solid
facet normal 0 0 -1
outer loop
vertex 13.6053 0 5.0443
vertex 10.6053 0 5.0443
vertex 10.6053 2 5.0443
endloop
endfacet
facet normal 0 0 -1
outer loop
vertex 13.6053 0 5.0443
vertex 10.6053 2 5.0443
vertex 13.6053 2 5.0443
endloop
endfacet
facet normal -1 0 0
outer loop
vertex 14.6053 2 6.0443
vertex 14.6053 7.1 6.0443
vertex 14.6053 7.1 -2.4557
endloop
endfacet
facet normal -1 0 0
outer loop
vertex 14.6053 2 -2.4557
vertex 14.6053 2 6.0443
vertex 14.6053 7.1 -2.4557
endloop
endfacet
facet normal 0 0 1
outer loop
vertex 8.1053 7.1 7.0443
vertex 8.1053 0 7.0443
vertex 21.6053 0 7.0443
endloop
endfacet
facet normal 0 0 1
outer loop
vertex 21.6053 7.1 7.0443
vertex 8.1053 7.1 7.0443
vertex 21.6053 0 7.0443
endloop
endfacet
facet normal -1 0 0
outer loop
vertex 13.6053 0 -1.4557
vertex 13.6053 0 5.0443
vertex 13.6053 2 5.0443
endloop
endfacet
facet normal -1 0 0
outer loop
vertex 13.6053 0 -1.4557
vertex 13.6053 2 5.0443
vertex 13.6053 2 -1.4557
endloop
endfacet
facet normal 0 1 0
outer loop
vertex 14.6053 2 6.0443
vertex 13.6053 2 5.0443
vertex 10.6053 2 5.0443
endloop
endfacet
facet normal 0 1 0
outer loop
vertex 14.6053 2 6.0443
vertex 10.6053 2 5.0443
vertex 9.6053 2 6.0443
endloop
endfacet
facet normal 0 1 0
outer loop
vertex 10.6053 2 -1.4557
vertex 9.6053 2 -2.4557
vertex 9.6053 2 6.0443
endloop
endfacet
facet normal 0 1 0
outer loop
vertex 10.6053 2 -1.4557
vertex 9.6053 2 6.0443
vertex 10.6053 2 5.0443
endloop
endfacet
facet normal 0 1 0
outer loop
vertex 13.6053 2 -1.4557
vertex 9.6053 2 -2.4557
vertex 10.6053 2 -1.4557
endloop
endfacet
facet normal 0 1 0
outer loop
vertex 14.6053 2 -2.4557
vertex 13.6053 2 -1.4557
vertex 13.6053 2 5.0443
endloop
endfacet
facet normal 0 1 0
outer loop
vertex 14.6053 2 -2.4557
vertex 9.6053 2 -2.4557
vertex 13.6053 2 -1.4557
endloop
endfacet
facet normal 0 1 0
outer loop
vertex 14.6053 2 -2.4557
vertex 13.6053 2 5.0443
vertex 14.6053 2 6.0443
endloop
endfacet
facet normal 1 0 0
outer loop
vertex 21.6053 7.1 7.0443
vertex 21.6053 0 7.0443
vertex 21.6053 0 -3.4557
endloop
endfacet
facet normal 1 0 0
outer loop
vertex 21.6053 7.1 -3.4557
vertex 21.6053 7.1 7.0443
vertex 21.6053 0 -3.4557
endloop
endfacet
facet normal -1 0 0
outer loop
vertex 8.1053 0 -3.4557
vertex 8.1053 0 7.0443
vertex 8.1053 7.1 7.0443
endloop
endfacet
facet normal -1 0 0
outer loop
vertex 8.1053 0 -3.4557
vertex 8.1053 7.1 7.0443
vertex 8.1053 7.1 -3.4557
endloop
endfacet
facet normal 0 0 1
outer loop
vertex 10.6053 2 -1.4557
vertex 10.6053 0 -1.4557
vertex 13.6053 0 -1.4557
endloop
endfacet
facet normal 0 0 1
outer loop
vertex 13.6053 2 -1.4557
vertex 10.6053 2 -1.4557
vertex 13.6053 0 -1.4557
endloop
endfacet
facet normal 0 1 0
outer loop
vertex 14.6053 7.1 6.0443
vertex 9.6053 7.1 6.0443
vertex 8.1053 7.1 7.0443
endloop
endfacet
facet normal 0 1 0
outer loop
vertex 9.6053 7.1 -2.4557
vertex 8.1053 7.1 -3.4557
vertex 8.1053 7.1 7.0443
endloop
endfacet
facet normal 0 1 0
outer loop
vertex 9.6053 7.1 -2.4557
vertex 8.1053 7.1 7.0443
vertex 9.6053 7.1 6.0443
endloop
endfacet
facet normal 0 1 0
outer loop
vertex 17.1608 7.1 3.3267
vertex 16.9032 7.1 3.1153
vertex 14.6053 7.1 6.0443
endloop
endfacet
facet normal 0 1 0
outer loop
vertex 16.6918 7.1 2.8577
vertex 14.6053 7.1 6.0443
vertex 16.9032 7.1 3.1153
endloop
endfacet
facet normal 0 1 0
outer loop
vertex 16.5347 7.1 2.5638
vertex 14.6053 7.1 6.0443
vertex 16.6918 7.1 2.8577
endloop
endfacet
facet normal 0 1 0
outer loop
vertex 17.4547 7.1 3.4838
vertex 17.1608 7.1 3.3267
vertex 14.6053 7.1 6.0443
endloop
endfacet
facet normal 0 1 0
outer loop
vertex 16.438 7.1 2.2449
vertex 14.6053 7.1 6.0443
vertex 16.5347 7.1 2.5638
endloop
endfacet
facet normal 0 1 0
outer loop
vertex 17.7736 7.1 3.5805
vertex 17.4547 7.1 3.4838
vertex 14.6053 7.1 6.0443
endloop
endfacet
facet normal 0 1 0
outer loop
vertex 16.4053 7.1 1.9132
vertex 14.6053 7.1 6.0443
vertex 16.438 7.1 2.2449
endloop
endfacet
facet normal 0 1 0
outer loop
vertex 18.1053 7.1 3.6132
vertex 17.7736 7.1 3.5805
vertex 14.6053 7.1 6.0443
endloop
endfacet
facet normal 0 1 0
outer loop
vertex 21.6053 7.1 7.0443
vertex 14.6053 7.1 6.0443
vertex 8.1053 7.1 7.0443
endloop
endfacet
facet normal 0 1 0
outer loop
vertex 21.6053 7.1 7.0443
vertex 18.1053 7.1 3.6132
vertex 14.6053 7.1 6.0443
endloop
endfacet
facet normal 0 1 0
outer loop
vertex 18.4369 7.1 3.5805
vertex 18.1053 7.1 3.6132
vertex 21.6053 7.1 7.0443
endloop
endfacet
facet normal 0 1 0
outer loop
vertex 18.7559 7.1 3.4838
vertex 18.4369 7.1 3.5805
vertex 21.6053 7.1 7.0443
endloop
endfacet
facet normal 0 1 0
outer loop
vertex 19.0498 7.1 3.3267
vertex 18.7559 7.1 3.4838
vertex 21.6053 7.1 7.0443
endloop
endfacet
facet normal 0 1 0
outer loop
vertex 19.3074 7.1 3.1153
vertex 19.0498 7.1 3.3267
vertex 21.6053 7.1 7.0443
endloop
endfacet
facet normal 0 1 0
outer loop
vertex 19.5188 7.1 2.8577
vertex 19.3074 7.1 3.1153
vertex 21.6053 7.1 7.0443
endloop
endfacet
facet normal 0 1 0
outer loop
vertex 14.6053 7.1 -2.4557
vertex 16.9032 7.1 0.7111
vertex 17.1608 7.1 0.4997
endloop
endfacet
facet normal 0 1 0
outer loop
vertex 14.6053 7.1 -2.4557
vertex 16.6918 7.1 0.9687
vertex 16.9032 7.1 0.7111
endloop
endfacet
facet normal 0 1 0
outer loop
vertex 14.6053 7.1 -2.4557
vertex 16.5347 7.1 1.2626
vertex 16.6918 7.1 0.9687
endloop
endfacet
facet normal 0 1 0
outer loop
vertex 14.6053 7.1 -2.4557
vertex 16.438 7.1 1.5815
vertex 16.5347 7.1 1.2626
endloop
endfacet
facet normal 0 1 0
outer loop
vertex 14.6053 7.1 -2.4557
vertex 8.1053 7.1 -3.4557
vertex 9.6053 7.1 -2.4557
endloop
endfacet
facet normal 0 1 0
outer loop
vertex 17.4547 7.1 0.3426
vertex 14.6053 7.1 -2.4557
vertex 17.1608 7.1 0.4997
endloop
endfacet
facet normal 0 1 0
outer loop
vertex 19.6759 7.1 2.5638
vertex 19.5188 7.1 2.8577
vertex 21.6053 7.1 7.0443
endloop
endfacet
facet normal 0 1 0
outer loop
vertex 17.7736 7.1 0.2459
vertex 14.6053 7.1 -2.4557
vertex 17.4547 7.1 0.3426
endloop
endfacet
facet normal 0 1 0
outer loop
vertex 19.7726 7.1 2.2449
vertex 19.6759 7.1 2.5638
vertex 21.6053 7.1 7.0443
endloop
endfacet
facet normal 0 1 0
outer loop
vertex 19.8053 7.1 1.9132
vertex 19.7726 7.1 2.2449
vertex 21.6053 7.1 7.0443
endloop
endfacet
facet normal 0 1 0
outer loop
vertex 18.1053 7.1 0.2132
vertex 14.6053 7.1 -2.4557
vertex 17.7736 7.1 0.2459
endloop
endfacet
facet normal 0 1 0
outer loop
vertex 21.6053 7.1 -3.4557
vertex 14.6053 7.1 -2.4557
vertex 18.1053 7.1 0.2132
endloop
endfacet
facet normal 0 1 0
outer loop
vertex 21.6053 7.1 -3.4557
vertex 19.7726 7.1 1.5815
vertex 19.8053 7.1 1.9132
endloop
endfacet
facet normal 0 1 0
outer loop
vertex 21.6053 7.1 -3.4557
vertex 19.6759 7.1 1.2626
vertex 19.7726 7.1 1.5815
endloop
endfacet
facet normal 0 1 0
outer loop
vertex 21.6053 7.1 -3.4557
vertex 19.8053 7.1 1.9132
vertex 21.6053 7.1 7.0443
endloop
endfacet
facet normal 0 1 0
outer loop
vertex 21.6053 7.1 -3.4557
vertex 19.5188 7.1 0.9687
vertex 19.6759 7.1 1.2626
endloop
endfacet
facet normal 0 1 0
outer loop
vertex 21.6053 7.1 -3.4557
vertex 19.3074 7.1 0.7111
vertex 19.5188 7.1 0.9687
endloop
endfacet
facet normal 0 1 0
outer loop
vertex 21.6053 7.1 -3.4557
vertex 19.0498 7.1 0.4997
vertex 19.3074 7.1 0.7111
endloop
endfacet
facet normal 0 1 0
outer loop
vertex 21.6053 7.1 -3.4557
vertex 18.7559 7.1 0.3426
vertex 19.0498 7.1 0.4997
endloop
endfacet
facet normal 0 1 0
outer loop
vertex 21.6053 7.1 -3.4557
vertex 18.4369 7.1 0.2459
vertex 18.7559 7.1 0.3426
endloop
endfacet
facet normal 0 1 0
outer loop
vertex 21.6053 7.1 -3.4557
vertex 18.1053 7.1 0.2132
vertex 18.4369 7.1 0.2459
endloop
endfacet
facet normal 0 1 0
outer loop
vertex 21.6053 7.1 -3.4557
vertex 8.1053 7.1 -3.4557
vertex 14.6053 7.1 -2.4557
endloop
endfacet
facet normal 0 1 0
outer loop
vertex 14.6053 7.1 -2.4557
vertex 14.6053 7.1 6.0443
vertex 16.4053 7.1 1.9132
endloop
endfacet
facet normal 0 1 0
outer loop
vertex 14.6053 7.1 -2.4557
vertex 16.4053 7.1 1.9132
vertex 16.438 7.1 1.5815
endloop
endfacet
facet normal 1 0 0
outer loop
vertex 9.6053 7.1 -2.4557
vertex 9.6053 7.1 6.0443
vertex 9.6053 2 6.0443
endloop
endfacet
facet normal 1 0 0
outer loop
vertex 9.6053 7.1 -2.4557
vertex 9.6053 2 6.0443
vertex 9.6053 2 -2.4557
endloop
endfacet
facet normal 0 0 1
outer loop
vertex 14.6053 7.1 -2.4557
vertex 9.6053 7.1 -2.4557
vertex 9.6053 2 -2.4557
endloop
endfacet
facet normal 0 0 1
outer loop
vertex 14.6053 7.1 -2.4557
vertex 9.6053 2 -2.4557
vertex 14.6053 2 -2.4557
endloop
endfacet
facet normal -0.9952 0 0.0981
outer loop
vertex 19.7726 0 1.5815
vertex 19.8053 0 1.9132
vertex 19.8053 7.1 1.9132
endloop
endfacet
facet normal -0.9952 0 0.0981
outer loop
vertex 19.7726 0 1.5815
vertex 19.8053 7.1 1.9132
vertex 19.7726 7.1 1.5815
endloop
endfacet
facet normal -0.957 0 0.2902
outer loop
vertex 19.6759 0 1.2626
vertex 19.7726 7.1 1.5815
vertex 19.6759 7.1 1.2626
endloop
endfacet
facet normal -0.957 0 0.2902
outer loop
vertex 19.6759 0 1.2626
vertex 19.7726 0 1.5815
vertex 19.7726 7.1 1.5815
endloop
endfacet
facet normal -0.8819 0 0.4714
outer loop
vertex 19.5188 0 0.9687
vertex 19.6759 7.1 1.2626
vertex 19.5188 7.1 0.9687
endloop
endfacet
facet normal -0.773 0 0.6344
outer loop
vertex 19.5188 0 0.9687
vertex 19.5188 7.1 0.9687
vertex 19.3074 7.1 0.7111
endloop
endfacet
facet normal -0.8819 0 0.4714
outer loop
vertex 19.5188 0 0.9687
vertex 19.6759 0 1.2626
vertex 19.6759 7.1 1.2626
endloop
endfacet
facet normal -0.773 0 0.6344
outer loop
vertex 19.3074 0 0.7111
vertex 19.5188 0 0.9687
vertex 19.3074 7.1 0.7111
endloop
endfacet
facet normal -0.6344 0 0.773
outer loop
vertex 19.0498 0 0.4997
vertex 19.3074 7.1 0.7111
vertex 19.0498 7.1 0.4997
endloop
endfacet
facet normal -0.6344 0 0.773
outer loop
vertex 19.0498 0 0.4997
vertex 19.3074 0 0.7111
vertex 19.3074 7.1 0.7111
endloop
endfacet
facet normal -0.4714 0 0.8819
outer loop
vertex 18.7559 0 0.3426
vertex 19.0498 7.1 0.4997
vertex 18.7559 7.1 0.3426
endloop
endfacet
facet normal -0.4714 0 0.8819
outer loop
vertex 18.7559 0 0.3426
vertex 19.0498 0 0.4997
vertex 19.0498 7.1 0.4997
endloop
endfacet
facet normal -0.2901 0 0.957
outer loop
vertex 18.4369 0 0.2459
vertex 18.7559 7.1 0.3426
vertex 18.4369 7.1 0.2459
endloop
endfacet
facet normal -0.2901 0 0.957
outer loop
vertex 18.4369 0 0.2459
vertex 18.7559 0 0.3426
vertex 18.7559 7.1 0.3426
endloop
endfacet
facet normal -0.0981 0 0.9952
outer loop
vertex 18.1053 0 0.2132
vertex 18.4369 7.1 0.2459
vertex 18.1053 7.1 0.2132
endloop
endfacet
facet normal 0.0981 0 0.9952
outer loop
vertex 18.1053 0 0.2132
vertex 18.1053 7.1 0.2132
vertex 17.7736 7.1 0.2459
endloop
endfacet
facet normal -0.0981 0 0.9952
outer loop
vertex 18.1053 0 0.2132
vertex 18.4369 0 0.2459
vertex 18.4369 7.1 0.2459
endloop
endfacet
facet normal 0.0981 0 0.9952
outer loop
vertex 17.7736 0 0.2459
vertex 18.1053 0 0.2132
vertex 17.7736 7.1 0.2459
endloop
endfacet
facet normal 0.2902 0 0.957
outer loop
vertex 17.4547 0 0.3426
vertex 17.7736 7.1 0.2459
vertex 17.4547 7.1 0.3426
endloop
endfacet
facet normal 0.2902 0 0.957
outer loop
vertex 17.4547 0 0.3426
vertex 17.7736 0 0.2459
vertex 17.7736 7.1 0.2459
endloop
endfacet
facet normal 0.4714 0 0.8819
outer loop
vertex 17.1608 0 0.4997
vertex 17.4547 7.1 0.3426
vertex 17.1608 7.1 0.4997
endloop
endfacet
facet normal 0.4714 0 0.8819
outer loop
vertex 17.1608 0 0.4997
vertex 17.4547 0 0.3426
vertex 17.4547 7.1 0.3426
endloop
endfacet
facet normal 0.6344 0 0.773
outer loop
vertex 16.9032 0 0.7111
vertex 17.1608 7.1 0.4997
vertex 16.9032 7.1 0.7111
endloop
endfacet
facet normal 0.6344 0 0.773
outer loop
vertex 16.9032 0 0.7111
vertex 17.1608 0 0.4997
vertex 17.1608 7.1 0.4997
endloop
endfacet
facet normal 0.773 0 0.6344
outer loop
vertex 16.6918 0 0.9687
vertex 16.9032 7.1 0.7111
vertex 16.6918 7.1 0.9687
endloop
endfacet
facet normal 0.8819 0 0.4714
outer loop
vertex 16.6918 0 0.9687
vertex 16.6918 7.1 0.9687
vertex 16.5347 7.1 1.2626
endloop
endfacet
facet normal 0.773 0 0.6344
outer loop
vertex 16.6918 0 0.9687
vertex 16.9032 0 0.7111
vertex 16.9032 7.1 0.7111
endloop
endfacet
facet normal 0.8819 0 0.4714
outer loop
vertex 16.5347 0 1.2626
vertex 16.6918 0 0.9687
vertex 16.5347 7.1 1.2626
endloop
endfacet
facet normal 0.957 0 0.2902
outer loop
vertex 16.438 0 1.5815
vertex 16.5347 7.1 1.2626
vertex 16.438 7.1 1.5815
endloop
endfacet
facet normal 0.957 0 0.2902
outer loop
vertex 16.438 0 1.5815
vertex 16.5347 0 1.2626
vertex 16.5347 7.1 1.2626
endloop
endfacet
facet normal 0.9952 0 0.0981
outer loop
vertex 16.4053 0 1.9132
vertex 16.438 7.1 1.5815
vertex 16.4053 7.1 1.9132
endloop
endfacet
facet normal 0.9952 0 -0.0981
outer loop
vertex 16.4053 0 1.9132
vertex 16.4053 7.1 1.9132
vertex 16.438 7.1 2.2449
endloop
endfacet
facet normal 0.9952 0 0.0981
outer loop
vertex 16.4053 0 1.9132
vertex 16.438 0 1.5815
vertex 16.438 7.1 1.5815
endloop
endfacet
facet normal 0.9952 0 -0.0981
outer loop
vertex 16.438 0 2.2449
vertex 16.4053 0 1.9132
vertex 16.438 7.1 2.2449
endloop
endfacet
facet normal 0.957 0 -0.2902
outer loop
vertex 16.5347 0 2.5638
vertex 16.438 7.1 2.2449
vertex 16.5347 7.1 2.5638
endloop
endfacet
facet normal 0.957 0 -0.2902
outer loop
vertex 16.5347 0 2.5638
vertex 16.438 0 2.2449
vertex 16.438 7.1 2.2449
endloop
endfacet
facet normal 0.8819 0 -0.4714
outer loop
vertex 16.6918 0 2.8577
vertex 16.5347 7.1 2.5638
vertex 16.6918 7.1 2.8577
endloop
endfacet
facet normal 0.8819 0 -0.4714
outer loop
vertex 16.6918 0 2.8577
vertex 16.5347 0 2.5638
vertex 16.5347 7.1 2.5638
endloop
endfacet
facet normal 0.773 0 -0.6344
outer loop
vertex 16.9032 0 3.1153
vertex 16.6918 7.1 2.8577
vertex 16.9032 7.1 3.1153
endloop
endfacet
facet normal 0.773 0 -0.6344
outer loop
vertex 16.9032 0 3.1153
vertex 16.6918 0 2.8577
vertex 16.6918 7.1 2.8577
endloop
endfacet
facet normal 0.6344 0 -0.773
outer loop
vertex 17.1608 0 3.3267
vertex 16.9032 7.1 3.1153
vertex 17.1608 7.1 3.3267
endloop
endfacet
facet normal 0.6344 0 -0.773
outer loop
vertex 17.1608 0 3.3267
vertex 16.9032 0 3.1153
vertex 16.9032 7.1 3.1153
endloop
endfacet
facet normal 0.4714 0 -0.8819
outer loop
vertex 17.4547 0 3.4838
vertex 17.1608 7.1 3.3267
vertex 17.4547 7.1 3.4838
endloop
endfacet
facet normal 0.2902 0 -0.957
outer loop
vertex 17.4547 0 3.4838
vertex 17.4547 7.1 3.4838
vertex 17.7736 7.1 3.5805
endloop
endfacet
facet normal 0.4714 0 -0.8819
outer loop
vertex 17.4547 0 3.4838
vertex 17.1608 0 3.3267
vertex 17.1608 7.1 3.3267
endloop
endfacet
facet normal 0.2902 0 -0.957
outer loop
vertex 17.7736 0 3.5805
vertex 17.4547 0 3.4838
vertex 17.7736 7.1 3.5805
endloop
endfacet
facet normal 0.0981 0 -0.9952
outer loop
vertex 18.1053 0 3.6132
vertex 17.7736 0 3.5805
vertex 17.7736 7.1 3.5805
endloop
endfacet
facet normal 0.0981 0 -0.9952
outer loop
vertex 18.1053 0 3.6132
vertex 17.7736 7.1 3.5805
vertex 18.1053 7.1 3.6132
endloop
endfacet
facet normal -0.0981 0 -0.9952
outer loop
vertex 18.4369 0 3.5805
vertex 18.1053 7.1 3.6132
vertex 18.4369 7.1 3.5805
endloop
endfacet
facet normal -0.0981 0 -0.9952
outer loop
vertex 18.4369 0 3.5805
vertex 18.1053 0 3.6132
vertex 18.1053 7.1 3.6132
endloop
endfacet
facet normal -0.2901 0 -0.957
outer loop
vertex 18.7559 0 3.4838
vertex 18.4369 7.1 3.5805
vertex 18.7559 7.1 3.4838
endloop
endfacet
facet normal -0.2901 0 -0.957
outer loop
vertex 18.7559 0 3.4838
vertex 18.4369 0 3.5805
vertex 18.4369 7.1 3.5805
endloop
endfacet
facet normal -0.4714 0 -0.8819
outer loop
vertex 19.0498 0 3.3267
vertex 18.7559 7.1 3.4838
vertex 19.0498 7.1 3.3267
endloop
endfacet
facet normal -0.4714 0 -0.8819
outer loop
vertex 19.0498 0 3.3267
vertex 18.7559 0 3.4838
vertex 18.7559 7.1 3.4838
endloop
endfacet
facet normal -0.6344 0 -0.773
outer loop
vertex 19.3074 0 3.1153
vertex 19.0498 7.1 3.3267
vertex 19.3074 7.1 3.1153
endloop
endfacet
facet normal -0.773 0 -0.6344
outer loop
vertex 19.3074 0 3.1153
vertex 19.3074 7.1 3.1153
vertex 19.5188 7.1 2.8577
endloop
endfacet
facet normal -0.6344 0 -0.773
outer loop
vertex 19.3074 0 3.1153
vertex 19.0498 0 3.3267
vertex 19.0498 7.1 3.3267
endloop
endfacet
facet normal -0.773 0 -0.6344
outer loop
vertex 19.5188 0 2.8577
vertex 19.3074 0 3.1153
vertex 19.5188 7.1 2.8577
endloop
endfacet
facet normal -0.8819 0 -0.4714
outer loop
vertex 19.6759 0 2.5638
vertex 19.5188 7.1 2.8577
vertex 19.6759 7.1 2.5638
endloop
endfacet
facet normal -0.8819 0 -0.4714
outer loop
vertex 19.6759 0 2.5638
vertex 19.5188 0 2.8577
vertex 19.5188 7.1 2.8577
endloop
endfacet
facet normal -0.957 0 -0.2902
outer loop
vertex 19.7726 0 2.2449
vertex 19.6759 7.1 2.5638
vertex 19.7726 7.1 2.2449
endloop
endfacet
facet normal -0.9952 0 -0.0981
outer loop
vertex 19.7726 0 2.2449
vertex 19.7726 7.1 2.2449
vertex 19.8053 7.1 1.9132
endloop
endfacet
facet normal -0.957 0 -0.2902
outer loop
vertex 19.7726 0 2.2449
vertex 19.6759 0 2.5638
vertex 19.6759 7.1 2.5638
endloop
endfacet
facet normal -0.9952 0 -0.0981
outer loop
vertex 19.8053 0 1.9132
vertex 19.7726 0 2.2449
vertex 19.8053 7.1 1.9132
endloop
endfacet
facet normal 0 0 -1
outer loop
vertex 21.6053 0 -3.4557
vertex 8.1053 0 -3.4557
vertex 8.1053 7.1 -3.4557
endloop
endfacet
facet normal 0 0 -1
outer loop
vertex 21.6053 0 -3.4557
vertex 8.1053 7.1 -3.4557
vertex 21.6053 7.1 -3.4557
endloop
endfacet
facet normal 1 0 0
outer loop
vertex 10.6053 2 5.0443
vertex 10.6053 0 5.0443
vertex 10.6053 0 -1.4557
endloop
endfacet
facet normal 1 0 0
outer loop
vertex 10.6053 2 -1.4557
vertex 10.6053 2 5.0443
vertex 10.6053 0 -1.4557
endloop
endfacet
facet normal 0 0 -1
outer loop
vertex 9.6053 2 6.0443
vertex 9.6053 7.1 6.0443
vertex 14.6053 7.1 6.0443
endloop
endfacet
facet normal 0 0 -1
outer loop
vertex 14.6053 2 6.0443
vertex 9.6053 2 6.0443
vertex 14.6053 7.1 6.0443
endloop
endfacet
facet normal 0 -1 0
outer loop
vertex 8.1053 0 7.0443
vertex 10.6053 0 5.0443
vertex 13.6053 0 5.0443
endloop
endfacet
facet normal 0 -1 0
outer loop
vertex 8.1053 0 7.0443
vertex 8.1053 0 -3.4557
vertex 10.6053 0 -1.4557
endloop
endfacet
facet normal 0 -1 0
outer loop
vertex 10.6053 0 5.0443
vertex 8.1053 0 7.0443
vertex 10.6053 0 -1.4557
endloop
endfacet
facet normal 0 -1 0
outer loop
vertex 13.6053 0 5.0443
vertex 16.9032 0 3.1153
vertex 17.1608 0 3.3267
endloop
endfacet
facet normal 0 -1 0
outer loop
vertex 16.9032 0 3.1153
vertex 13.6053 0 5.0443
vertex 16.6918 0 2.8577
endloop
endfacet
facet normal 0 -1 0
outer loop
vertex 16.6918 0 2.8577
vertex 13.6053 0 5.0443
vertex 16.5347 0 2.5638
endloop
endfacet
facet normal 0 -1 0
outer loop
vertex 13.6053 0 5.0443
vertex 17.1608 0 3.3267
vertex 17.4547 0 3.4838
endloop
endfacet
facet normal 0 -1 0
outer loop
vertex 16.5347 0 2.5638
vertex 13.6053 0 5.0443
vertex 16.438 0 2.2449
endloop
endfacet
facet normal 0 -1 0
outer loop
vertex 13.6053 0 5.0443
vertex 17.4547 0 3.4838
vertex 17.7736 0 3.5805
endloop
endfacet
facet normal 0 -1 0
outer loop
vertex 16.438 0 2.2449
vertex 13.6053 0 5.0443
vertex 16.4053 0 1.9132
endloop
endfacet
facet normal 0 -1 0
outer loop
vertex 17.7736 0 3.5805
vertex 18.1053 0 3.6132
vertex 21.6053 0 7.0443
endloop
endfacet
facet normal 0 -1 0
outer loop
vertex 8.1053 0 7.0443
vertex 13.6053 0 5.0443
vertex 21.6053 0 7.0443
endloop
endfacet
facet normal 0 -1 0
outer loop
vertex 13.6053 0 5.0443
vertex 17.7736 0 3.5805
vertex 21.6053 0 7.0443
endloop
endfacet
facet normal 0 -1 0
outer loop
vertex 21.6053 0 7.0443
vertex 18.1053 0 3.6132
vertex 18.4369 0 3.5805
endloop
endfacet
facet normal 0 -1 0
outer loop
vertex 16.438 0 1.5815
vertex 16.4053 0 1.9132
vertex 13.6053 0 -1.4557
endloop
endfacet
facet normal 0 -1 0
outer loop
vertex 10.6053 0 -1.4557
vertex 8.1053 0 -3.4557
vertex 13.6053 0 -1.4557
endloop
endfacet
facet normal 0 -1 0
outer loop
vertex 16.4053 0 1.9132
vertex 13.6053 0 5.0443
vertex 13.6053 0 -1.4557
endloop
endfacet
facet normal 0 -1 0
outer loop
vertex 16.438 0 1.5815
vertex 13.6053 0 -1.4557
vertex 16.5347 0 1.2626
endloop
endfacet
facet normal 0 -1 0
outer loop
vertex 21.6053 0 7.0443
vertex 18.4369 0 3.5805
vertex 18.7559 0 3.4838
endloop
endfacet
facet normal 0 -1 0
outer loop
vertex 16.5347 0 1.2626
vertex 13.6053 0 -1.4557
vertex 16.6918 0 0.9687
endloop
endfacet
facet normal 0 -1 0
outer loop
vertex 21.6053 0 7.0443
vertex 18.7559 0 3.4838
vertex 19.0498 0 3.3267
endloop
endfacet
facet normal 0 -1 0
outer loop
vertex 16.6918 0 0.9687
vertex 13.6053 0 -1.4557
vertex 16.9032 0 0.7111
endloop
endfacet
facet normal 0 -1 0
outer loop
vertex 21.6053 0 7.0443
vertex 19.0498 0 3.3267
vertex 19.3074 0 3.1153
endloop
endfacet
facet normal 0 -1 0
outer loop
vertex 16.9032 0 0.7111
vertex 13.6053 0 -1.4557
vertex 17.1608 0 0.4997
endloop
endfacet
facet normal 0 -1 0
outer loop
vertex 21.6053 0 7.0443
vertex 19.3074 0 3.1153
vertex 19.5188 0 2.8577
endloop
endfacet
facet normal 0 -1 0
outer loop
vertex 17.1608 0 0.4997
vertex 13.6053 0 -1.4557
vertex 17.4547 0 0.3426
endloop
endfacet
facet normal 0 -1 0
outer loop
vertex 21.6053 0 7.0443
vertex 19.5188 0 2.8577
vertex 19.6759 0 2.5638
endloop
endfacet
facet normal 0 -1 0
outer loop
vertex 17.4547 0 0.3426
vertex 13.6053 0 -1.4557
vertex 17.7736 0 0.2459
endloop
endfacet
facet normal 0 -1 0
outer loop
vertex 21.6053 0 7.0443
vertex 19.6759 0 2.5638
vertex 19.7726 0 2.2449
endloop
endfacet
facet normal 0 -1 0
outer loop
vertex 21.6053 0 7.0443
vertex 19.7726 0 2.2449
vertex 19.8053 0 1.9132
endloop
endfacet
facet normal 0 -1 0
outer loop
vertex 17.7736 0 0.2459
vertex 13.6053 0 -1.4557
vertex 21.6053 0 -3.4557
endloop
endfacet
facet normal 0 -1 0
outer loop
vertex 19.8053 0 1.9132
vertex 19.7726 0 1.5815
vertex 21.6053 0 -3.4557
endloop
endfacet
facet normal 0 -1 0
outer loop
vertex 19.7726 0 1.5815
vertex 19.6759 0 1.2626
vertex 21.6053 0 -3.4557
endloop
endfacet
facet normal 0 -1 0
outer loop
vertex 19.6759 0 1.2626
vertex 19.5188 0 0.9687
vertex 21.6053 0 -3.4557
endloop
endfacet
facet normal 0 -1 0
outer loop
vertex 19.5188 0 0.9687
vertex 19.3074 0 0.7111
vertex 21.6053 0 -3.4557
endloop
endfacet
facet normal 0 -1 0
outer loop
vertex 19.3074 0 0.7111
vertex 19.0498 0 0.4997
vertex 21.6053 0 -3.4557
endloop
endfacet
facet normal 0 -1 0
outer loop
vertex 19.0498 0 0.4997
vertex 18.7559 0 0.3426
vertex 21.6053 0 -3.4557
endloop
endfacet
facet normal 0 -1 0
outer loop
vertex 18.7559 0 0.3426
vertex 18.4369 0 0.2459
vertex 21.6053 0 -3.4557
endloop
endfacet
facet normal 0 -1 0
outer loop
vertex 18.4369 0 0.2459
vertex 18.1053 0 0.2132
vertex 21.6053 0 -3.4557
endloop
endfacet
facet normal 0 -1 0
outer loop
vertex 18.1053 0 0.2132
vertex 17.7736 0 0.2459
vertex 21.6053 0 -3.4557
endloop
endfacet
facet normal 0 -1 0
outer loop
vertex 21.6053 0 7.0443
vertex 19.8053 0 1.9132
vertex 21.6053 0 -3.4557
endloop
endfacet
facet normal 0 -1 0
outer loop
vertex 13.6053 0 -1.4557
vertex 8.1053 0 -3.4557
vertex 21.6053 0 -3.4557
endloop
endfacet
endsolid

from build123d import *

# Parameters (mm, degrees)
CROQUIS1_W              = 13.5
CROQUIS1_H              = 10.5
CROQUIS1_R              = 1.7
CROQUIS1_W_2            = 3
CROQUIS1_H_2            = 6.5
SALIENTE_EXTRUIR1_DEPTH = 7.1
CROQUIS2_W              = 5
CROQUIS2_H              = 8.5
CORTAR_EXTRUIR1_DEPTH   = 5.1


with BuildPart() as part:
    # Croquis1 → Saliente-Extruir1 (new body)
    with BuildSketch(Plane(origin=(0, 0, 0), x_dir=(1, 0, 0), z_dir=(0, 1, 0))):
        with Locations((14.85529294, -1.794299578)):
            Rectangle(CROQUIS1_W, CROQUIS1_H)
        with Locations((18.10529294, -1.913201206)):
            Circle(CROQUIS1_R, mode=Mode.SUBTRACT)
        with Locations((12.10529294, -1.794299578)):
            Rectangle(CROQUIS1_W_2, CROQUIS1_H_2, mode=Mode.SUBTRACT)
    extrude(amount=SALIENTE_EXTRUIR1_DEPTH)

    # Croquis2 → Cortar-Extruir1 (cut)
    with BuildSketch(Plane(origin=(0, 7.1, 0), x_dir=(1, 0, 0), z_dir=(0, 1, 0))):
        with Locations((12.10529294, -1.794299578)):
            Rectangle(CROQUIS2_W, CROQUIS2_H)
    extrude(amount=-CORTAR_EXTRUIR1_DEPTH, mode=Mode.SUBTRACT)


solid = part.part
